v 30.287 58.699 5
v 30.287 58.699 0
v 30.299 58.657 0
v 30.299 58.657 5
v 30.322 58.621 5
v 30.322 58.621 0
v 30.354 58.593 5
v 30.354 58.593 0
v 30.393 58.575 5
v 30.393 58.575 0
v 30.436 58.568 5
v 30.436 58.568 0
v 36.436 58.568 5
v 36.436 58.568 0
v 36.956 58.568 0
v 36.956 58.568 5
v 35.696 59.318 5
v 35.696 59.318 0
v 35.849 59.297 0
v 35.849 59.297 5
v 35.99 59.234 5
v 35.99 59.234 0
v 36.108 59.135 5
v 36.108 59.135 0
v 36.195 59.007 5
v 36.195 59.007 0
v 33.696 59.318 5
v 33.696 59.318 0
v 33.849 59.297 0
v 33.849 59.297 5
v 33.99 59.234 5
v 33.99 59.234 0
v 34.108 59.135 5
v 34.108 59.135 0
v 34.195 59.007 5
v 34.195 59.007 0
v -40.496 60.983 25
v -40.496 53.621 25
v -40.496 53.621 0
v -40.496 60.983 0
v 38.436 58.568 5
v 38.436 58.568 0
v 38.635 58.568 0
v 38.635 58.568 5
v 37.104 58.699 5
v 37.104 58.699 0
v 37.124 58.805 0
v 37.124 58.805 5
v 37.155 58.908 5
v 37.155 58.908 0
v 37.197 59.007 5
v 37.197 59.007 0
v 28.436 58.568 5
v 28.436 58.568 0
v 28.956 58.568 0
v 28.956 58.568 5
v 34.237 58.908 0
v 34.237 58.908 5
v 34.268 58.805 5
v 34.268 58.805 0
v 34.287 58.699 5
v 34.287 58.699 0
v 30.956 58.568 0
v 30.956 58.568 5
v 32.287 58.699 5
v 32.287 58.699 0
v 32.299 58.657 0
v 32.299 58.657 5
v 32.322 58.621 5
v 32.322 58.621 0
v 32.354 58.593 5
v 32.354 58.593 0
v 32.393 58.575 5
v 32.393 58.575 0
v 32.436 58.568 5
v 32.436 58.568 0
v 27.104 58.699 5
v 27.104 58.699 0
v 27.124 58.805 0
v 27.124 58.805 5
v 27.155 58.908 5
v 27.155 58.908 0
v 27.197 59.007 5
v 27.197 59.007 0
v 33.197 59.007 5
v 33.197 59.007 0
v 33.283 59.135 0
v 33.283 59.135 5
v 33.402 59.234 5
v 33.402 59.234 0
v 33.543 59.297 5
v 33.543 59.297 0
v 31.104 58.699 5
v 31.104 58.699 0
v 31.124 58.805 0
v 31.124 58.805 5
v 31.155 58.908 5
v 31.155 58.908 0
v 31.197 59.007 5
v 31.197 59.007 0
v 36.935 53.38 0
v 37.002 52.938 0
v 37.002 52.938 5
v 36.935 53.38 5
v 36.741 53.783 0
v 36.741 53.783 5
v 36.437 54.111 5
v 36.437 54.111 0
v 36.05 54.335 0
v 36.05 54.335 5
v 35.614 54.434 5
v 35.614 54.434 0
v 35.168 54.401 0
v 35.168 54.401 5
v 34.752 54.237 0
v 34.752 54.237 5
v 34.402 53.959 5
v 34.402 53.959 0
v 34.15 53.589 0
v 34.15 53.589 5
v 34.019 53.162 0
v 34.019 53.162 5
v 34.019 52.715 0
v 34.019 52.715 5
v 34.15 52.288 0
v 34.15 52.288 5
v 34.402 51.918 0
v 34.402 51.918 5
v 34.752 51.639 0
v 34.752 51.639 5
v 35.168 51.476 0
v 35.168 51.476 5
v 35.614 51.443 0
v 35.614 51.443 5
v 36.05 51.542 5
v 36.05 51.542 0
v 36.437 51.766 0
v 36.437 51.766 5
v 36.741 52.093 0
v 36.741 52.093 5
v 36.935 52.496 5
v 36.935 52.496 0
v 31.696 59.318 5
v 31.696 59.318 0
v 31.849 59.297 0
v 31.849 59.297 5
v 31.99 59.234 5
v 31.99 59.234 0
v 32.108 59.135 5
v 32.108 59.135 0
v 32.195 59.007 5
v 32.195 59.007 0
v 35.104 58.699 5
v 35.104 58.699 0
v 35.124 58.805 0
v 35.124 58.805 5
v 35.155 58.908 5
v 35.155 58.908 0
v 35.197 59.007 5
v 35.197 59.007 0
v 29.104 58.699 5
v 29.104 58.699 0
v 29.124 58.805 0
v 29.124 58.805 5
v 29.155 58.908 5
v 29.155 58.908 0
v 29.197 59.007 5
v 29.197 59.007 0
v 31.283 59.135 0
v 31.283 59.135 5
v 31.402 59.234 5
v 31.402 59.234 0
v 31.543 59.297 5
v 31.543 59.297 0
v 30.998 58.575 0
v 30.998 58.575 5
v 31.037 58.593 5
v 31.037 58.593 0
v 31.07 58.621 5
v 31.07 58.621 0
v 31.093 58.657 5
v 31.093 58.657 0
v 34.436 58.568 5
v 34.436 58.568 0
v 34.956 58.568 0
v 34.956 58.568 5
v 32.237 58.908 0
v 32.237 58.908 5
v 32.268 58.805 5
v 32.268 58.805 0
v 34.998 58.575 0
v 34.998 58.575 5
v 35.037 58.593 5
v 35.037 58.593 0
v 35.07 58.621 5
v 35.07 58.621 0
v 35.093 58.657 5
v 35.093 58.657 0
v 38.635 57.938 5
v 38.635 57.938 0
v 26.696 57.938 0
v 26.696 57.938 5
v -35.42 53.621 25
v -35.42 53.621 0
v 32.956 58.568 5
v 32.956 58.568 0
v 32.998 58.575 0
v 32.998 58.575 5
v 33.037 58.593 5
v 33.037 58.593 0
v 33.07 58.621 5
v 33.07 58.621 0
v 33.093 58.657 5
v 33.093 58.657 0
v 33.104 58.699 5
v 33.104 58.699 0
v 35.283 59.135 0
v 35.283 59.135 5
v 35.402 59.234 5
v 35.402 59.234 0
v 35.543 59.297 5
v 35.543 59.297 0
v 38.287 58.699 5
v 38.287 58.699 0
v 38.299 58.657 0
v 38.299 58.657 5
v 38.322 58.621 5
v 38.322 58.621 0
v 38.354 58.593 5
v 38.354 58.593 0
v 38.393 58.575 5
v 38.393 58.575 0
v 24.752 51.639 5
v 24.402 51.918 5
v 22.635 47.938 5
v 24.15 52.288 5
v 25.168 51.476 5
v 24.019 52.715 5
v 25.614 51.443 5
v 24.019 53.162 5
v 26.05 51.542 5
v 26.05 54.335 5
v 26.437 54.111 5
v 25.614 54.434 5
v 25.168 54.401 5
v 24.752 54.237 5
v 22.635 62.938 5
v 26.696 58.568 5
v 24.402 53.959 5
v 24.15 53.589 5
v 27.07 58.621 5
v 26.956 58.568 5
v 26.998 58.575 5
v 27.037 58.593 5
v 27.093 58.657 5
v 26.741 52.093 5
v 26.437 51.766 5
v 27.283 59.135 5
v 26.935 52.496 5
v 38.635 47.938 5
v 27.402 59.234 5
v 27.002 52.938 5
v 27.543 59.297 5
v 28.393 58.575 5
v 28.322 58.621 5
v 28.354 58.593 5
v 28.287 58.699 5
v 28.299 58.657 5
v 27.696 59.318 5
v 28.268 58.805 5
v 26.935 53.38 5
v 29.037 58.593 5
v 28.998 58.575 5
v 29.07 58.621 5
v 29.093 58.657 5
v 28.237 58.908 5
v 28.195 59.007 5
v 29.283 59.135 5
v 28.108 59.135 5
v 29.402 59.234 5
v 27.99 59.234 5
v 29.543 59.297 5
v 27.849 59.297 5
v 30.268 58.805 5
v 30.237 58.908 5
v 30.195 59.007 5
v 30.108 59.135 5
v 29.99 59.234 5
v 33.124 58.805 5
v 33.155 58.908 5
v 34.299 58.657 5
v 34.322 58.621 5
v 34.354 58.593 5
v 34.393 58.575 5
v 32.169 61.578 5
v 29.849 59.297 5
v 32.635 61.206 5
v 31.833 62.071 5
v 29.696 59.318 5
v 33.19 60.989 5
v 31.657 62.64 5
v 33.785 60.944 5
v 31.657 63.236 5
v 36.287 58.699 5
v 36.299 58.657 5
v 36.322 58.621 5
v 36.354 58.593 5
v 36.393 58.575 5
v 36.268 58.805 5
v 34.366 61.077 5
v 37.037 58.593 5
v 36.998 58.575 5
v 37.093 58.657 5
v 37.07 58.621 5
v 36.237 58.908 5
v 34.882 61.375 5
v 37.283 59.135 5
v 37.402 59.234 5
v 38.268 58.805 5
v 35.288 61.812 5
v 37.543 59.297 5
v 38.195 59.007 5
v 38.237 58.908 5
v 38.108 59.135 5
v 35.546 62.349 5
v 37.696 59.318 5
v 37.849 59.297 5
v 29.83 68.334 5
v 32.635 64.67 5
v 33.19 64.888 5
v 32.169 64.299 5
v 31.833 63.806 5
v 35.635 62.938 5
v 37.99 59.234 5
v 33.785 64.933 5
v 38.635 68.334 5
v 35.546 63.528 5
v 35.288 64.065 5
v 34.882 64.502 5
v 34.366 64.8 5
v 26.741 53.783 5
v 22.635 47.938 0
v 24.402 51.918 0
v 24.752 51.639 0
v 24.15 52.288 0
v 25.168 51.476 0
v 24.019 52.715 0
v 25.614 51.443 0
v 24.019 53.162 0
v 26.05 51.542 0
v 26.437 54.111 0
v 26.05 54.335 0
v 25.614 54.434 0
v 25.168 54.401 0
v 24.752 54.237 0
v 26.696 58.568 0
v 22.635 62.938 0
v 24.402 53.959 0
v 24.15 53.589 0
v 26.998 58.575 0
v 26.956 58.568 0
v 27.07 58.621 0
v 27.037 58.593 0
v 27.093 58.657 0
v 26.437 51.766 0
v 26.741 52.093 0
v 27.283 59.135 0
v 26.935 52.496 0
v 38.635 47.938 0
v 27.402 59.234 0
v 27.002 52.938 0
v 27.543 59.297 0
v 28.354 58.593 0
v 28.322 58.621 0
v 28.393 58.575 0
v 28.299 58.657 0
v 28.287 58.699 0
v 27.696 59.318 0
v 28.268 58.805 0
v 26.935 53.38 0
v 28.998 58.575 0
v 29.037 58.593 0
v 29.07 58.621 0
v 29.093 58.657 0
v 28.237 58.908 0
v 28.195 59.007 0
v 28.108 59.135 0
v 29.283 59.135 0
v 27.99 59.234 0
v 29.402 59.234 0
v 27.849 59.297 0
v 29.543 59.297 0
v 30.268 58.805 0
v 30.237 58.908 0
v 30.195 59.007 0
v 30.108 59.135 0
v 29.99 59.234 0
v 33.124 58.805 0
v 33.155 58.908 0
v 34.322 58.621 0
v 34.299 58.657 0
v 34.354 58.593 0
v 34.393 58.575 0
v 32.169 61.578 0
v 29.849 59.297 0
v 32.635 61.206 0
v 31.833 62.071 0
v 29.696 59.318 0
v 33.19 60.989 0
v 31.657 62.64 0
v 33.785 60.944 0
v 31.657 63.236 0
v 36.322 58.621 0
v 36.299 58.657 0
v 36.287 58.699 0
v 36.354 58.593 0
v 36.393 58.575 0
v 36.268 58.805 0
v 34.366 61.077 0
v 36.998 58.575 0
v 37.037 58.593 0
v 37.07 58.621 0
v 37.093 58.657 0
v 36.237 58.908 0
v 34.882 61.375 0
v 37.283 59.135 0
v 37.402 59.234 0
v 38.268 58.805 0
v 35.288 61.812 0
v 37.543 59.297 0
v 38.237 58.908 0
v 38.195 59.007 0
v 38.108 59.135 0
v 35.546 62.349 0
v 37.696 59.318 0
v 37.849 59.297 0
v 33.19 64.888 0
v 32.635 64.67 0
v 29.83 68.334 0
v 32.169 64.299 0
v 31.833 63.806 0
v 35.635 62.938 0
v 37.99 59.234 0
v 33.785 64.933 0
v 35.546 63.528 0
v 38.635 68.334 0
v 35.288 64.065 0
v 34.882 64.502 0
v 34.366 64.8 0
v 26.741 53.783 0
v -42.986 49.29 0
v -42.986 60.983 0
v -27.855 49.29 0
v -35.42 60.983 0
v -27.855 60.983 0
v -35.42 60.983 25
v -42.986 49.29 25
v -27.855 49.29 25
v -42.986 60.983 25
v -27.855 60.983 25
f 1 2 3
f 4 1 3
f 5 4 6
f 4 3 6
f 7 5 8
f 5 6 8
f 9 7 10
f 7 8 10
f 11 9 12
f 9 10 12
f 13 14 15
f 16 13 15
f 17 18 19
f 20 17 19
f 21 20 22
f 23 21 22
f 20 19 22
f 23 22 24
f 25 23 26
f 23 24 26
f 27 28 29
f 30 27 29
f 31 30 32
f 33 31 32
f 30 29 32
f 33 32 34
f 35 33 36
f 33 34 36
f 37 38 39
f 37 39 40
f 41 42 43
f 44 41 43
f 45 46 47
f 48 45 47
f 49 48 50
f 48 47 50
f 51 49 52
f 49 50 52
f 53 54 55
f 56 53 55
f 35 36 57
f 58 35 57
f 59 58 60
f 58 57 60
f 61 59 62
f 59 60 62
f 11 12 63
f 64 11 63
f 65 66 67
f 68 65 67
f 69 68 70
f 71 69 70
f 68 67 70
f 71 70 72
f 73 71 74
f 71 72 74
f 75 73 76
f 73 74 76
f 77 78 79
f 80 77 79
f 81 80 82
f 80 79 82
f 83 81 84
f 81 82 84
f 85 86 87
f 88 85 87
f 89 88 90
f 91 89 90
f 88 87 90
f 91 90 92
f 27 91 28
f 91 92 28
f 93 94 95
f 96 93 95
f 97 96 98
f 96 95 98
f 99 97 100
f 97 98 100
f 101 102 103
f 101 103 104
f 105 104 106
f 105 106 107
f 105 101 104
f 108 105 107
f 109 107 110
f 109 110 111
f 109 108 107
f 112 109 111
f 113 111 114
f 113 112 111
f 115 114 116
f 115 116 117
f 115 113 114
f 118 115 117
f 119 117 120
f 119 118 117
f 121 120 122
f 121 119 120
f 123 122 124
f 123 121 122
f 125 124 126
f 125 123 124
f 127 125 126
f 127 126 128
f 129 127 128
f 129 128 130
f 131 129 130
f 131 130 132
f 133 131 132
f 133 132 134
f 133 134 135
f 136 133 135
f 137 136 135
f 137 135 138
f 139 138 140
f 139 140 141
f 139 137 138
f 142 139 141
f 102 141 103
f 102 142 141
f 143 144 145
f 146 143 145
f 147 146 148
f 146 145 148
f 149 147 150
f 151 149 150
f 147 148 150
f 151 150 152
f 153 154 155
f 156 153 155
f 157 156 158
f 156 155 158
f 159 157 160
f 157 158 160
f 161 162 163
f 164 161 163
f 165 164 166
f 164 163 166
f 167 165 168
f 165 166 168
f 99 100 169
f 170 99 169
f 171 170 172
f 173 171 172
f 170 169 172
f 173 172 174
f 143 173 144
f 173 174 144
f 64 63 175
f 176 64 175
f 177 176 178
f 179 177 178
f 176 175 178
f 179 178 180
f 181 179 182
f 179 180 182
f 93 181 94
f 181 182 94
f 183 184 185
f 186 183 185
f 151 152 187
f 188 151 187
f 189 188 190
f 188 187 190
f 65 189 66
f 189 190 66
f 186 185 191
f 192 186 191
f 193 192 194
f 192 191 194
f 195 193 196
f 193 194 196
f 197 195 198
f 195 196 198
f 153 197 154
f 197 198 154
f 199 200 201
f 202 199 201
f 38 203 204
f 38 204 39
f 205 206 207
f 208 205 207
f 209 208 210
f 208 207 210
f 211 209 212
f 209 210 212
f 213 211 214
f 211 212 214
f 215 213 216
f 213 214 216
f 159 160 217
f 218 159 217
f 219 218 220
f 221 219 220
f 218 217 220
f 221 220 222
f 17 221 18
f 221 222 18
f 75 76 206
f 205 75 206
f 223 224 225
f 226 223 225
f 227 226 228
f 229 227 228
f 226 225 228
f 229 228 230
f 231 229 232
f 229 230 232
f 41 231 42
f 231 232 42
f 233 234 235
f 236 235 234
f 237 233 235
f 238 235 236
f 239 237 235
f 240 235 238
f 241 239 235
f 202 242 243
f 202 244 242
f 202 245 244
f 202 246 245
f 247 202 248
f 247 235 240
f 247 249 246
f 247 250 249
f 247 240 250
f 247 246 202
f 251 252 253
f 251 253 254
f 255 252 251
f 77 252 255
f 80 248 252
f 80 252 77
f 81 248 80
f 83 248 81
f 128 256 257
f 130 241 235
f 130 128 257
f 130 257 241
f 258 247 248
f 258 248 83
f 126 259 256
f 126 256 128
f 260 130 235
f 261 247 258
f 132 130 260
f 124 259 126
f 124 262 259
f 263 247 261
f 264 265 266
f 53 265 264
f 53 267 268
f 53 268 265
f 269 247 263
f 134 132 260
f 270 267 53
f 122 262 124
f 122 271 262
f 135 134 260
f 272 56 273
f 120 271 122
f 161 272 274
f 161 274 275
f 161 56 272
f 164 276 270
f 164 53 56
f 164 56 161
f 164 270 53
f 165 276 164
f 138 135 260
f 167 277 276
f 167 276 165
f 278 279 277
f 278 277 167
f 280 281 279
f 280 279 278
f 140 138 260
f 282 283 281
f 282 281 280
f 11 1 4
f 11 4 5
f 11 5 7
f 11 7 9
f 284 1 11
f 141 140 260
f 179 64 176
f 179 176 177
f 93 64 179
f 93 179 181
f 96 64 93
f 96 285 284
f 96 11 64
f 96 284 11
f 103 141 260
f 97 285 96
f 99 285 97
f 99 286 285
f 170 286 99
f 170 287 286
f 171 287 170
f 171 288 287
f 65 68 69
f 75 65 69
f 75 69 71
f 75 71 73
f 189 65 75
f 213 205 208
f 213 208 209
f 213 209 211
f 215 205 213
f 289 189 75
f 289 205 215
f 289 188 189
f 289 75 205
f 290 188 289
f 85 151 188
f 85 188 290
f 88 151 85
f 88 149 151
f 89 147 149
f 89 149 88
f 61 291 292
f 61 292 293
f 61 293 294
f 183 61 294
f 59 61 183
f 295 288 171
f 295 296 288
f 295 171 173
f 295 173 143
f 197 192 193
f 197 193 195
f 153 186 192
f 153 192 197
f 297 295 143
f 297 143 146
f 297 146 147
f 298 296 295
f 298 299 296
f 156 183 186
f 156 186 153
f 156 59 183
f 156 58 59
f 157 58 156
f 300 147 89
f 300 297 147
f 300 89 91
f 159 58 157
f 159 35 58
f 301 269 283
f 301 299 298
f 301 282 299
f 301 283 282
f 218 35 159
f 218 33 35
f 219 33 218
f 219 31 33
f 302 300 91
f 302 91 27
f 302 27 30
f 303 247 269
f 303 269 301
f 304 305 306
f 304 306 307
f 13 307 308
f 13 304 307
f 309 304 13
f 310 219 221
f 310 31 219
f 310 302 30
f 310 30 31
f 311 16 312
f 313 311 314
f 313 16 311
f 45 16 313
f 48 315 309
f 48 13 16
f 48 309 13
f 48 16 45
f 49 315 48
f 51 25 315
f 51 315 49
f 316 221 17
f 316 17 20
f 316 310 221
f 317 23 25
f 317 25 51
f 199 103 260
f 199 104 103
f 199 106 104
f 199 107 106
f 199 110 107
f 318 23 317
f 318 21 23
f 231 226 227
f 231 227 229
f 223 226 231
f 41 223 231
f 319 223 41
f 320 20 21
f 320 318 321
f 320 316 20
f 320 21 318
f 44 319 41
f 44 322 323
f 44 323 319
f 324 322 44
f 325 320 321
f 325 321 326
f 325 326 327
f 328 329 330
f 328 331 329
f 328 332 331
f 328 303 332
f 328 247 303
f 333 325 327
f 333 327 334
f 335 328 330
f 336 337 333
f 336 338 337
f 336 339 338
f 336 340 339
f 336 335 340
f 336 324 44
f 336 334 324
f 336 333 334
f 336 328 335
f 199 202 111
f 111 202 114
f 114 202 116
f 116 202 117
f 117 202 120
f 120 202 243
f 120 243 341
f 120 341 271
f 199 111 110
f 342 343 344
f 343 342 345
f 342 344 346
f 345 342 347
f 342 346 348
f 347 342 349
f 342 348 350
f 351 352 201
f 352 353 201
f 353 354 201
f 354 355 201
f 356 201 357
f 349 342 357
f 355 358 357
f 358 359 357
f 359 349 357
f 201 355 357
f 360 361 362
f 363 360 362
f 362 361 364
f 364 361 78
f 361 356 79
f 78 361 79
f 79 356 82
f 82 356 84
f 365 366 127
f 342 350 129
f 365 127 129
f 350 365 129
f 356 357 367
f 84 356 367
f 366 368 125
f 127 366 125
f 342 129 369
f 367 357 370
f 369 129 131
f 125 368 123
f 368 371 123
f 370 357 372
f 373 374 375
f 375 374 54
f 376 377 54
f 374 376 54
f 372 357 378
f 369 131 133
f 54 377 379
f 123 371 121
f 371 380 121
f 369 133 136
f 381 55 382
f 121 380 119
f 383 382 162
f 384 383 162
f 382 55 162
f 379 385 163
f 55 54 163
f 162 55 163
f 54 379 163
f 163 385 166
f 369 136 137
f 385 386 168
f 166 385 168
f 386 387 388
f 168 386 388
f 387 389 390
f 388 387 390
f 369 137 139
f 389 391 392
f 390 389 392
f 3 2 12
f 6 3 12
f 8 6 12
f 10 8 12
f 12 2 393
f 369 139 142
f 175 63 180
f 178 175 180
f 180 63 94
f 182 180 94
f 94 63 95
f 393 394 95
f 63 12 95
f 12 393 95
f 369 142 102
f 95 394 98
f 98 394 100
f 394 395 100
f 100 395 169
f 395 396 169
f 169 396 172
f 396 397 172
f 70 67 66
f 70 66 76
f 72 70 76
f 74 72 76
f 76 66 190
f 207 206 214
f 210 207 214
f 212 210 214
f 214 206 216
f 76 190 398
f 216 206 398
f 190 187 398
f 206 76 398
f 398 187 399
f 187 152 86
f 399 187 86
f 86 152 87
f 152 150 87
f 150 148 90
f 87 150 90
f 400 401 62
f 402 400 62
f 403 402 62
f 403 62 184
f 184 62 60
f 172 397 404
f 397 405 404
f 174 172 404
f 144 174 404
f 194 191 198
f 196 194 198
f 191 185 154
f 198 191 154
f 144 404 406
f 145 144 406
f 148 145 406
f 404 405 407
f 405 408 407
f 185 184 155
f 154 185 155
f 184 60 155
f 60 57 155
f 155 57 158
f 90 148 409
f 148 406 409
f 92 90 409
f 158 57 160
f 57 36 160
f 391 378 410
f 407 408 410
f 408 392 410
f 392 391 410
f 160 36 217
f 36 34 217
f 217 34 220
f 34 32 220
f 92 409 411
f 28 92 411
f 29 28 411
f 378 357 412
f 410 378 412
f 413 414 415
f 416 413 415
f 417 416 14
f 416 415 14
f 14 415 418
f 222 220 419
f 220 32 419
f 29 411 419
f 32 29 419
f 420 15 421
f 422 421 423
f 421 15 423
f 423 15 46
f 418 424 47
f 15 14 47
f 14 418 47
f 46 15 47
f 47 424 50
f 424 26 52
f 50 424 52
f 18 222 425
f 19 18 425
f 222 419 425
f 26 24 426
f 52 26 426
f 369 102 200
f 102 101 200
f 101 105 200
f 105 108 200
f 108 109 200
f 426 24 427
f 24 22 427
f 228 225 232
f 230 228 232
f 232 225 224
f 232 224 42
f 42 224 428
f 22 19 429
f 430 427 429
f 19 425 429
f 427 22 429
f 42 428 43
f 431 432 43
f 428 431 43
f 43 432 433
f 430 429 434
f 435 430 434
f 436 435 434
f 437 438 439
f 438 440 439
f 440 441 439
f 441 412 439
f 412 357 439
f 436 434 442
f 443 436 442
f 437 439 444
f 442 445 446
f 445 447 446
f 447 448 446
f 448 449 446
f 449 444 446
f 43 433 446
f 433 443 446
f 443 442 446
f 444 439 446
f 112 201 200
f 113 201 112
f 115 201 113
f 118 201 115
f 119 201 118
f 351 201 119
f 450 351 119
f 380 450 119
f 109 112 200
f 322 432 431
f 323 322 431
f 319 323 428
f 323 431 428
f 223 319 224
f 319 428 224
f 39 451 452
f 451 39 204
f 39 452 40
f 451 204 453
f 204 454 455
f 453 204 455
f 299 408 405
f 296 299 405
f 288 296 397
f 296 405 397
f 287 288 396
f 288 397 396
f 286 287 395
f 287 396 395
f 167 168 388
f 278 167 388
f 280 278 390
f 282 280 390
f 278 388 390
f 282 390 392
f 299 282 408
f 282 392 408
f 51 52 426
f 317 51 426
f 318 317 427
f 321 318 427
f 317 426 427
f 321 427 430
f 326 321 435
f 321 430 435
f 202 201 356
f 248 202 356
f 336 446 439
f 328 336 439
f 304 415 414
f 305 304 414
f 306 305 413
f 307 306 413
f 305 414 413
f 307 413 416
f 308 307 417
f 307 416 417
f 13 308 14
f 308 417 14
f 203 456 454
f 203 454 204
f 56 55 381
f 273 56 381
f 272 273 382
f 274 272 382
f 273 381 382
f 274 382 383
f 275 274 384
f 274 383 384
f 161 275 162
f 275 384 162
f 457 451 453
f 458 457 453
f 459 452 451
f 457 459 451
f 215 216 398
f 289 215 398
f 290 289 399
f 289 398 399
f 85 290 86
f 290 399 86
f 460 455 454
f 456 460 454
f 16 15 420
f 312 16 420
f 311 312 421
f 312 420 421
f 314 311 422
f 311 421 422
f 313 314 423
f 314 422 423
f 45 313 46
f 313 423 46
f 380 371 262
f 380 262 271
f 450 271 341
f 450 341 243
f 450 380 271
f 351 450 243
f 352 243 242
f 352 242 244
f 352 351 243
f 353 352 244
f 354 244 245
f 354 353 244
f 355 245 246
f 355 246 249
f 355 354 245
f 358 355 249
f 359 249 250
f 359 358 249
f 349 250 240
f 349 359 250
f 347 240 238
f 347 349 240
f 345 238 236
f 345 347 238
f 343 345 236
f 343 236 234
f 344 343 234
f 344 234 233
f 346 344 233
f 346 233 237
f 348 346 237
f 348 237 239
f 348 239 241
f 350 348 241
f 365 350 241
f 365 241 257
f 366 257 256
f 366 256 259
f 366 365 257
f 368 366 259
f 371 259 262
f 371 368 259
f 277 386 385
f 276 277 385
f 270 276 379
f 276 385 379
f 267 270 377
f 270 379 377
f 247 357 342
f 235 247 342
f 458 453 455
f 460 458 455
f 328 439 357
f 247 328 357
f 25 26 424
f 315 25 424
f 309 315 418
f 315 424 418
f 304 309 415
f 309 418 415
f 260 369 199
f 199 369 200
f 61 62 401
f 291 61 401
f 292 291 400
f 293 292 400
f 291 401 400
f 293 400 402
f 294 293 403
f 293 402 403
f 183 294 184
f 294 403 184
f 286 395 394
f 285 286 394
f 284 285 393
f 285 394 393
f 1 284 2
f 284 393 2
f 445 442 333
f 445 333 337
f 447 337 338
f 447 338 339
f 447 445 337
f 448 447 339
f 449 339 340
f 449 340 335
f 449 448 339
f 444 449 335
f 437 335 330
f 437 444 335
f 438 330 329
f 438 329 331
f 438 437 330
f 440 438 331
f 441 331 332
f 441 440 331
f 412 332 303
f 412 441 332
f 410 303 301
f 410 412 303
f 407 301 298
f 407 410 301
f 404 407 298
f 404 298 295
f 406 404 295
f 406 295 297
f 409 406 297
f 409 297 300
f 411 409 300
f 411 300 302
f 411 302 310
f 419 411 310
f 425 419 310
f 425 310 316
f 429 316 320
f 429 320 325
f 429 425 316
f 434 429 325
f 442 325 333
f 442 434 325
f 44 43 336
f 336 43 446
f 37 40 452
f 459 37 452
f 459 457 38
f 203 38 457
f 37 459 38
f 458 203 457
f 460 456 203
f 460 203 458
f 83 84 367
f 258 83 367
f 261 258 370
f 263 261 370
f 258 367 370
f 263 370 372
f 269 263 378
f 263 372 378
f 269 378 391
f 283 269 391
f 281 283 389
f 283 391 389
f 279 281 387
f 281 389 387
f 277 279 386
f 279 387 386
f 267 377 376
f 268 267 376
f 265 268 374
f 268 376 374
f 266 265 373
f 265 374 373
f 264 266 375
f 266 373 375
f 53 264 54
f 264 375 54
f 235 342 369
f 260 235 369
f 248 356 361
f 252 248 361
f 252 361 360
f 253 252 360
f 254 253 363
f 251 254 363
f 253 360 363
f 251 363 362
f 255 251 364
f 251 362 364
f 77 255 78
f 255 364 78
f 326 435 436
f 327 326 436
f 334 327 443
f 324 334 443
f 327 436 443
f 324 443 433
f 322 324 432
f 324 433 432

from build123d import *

# Parameters (mm, degrees)
F0_R     = 1.5
F0_R_2   = 2
F1_DEPTH = 5
F3_DEPTH = 25


with BuildPart() as f1:
    # F0 (on Top) → F1 (new body)
    with BuildSketch(Plane.XY):
        with BuildLine():
            Line((22.635065, 47.938364), (38.635065, 47.938364))
            Line((38.635065, 47.938364), (38.635065, 57.938363))
            Line((38.635065, 57.938363), (37.695793, 57.938363))
            Line((37.695793, 57.938363), (36.695793, 57.938363))
            Line((36.695793, 57.938363), (35.695793, 57.938363))
            Line((35.695793, 57.938363), (34.695793, 57.938363))
            Line((34.695793, 57.938363), (33.695793, 57.938363))
            Line((33.695793, 57.938363), (32.695793, 57.938363))
            Line((32.695793, 57.938363), (31.695793, 57.938363))
            Line((31.695793, 57.938363), (30.695793, 57.938363))
            Line((30.695793, 57.938363), (29.695793, 57.938363))
            Line((29.695793, 57.938363), (28.695793, 57.938363))
            Line((28.695793, 57.938363), (27.695793, 57.938363))
            Line((27.695793, 57.938363), (26.695793, 57.938363))
            Line((26.695793, 57.938363), (26.695793, 58.568363))
            Line((26.695793, 58.568363), (26.955618, 58.568363))
            ThreePointArc((26.955618, 58.568363), (27.054525, 58.605592), (27.104336, 58.698798))
            ThreePointArc((27.104336, 58.698798), (27.138182, 58.856426), (27.196917, 59.006566))
            ThreePointArc((27.196917, 59.006566), (27.401644, 59.234002), (27.695793, 59.318363))
            ThreePointArc((27.695793, 59.318363), (27.989943, 59.234002), (28.19467, 59.006566))
            ThreePointArc((28.19467, 59.006566), (28.253405, 58.856426), (28.28725, 58.698798))
            ThreePointArc((28.28725, 58.698798), (28.337062, 58.605592), (28.435969, 58.568363))
            Line((28.435969, 58.568363), (28.695793, 58.568363))
            Line((28.695793, 58.568363), (28.955618, 58.568363))
            ThreePointArc((28.955618, 58.568363), (29.054525, 58.605592), (29.104336, 58.698798))
            ThreePointArc((29.104336, 58.698798), (29.138182, 58.856426), (29.196917, 59.006566))
            ThreePointArc((29.196917, 59.006566), (29.401644, 59.234002), (29.695793, 59.318363))
            ThreePointArc((29.695793, 59.318363), (29.989943, 59.234002), (30.19467, 59.006566))
            ThreePointArc((30.19467, 59.006566), (30.253405, 58.856426), (30.28725, 58.698798))
            ThreePointArc((30.28725, 58.698798), (30.337062, 58.605592), (30.435969, 58.568363))
            Line((30.435969, 58.568363), (30.695793, 58.568363))
            Line((30.695793, 58.568363), (30.955618, 58.568363))
            ThreePointArc((30.955618, 58.568363), (31.054525, 58.605592), (31.104336, 58.698798))
            ThreePointArc((31.104336, 58.698798), (31.138182, 58.856426), (31.196917, 59.006566))
            ThreePointArc((31.196917, 59.006566), (31.401644, 59.234002), (31.695793, 59.318363))
            ThreePointArc((31.695793, 59.318363), (31.989943, 59.234002), (32.19467, 59.006566))
            ThreePointArc((32.19467, 59.006566), (32.253405, 58.856426), (32.28725, 58.698798))
            ThreePointArc((32.28725, 58.698798), (32.337062, 58.605592), (32.435969, 58.568363))
            Line((32.435969, 58.568363), (32.695793, 58.568363))
            Line((32.695793, 58.568363), (32.955618, 58.568363))
            ThreePointArc((32.955618, 58.568363), (33.054525, 58.605592), (33.104336, 58.698798))
            ThreePointArc((33.104336, 58.698798), (33.138182, 58.856426), (33.196917, 59.006566))
            ThreePointArc((33.196917, 59.006566), (33.401644, 59.234002), (33.695793, 59.318363))
            ThreePointArc((33.695793, 59.318363), (33.989943, 59.234002), (34.19467, 59.006566))
            ThreePointArc((34.19467, 59.006566), (34.253405, 58.856426), (34.28725, 58.698798))
            ThreePointArc((34.28725, 58.698798), (34.337062, 58.605592), (34.435969, 58.568363))
            Line((34.435969, 58.568363), (34.695793, 58.568363))
            Line((34.695793, 58.568363), (34.955618, 58.568363))
            ThreePointArc((34.955618, 58.568363), (35.054525, 58.605592), (35.104336, 58.698798))
            ThreePointArc((35.104336, 58.698798), (35.138182, 58.856426), (35.196917, 59.006566))
            ThreePointArc((35.196917, 59.006566), (35.401644, 59.234002), (35.695793, 59.318363))
            ThreePointArc((35.695793, 59.318363), (35.989943, 59.234002), (36.19467, 59.006566))
            ThreePointArc((36.19467, 59.006566), (36.253405, 58.856426), (36.28725, 58.698798))
            ThreePointArc((36.28725, 58.698798), (36.337062, 58.605592), (36.435969, 58.568363))
            Line((36.435969, 58.568363), (36.695793, 58.568363))
            Line((36.695793, 58.568363), (36.955618, 58.568363))
            ThreePointArc((36.955618, 58.568363), (37.054525, 58.605592), (37.104336, 58.698798))
            ThreePointArc((37.104336, 58.698798), (37.138182, 58.856426), (37.196917, 59.006566))
            ThreePointArc((37.196917, 59.006566), (37.401644, 59.234002), (37.695793, 59.318363))
            ThreePointArc((37.695793, 59.318363), (37.989943, 59.234002), (38.19467, 59.006566))
            ThreePointArc((38.19467, 59.006566), (38.253405, 58.856426), (38.28725, 58.698798))
            ThreePointArc((38.28725, 58.698798), (38.337062, 58.605592), (38.435969, 58.568363))
            Line((38.435969, 58.568363), (38.635065, 58.568363))
            Line((38.635065, 58.568363), (38.635065, 68.334497))
            Line((38.635065, 68.334497), (29.829909, 68.334497))
            Line((29.829909, 68.334497), (22.635065, 62.938364))
            Line((22.635065, 62.938364), (22.635065, 47.938364))
        make_face()
        with Locations((25.501795, 52.938364)):
            Circle(F0_R, mode=Mode.SUBTRACT)
        with Locations((35.501795, 52.938364)):
            Circle(F0_R, mode=Mode.SUBTRACT)
        with Locations((33.635065, 62.938364)):
            Circle(F0_R_2, mode=Mode.SUBTRACT)
    extrude(amount=F1_DEPTH)


with BuildPart() as f3:
    # F2 (on Top) → F3 (new body)
    with BuildSketch(Plane.XY):
        Polygon((-40.496297, 60.982537), (-42.985808, 60.982537), (-42.985808, 49.290396), (-27.854804, 49.290396), (-27.854804, 60.982537), (-35.420306, 60.982537), (-35.420306, 53.620983), (-40.496297, 53.620983), align=None)
    extrude(amount=F3_DEPTH)


solid = Compound([f1.part, f3.part])
